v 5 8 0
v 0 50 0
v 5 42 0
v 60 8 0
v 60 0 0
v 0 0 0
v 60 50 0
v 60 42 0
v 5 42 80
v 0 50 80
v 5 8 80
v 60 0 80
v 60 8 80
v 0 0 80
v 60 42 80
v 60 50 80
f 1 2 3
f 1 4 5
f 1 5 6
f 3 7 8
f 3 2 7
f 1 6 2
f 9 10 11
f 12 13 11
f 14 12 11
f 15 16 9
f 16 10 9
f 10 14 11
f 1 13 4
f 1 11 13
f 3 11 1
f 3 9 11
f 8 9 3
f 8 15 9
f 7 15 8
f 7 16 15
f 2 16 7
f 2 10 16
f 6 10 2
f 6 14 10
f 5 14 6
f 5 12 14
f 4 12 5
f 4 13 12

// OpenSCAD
$fn = 32;

// ----------------------------------------------------------------------
// Structural section: channel 60 x 50 mm
// ----------------------------------------------------------------------

// --- parameters (mm) ---
sec_w = 60;               // channel width, X
sec_h = 50;               // channel height, Y
flange_t = 8;             // flange thickness
web_t = 5;                // web thickness
plate_t = 80;             // cut length, Z (extrusion height)

profile = [[0, 0], [60, 0], [60, 8], [5, 8], [5, 42], [60, 42], [60, 50], [0, 50]];  // primary outline, 8 points, counter clockwise

// --- the one profile operation ---
linear_extrude(height = plate_t) polygon(points = profile);
